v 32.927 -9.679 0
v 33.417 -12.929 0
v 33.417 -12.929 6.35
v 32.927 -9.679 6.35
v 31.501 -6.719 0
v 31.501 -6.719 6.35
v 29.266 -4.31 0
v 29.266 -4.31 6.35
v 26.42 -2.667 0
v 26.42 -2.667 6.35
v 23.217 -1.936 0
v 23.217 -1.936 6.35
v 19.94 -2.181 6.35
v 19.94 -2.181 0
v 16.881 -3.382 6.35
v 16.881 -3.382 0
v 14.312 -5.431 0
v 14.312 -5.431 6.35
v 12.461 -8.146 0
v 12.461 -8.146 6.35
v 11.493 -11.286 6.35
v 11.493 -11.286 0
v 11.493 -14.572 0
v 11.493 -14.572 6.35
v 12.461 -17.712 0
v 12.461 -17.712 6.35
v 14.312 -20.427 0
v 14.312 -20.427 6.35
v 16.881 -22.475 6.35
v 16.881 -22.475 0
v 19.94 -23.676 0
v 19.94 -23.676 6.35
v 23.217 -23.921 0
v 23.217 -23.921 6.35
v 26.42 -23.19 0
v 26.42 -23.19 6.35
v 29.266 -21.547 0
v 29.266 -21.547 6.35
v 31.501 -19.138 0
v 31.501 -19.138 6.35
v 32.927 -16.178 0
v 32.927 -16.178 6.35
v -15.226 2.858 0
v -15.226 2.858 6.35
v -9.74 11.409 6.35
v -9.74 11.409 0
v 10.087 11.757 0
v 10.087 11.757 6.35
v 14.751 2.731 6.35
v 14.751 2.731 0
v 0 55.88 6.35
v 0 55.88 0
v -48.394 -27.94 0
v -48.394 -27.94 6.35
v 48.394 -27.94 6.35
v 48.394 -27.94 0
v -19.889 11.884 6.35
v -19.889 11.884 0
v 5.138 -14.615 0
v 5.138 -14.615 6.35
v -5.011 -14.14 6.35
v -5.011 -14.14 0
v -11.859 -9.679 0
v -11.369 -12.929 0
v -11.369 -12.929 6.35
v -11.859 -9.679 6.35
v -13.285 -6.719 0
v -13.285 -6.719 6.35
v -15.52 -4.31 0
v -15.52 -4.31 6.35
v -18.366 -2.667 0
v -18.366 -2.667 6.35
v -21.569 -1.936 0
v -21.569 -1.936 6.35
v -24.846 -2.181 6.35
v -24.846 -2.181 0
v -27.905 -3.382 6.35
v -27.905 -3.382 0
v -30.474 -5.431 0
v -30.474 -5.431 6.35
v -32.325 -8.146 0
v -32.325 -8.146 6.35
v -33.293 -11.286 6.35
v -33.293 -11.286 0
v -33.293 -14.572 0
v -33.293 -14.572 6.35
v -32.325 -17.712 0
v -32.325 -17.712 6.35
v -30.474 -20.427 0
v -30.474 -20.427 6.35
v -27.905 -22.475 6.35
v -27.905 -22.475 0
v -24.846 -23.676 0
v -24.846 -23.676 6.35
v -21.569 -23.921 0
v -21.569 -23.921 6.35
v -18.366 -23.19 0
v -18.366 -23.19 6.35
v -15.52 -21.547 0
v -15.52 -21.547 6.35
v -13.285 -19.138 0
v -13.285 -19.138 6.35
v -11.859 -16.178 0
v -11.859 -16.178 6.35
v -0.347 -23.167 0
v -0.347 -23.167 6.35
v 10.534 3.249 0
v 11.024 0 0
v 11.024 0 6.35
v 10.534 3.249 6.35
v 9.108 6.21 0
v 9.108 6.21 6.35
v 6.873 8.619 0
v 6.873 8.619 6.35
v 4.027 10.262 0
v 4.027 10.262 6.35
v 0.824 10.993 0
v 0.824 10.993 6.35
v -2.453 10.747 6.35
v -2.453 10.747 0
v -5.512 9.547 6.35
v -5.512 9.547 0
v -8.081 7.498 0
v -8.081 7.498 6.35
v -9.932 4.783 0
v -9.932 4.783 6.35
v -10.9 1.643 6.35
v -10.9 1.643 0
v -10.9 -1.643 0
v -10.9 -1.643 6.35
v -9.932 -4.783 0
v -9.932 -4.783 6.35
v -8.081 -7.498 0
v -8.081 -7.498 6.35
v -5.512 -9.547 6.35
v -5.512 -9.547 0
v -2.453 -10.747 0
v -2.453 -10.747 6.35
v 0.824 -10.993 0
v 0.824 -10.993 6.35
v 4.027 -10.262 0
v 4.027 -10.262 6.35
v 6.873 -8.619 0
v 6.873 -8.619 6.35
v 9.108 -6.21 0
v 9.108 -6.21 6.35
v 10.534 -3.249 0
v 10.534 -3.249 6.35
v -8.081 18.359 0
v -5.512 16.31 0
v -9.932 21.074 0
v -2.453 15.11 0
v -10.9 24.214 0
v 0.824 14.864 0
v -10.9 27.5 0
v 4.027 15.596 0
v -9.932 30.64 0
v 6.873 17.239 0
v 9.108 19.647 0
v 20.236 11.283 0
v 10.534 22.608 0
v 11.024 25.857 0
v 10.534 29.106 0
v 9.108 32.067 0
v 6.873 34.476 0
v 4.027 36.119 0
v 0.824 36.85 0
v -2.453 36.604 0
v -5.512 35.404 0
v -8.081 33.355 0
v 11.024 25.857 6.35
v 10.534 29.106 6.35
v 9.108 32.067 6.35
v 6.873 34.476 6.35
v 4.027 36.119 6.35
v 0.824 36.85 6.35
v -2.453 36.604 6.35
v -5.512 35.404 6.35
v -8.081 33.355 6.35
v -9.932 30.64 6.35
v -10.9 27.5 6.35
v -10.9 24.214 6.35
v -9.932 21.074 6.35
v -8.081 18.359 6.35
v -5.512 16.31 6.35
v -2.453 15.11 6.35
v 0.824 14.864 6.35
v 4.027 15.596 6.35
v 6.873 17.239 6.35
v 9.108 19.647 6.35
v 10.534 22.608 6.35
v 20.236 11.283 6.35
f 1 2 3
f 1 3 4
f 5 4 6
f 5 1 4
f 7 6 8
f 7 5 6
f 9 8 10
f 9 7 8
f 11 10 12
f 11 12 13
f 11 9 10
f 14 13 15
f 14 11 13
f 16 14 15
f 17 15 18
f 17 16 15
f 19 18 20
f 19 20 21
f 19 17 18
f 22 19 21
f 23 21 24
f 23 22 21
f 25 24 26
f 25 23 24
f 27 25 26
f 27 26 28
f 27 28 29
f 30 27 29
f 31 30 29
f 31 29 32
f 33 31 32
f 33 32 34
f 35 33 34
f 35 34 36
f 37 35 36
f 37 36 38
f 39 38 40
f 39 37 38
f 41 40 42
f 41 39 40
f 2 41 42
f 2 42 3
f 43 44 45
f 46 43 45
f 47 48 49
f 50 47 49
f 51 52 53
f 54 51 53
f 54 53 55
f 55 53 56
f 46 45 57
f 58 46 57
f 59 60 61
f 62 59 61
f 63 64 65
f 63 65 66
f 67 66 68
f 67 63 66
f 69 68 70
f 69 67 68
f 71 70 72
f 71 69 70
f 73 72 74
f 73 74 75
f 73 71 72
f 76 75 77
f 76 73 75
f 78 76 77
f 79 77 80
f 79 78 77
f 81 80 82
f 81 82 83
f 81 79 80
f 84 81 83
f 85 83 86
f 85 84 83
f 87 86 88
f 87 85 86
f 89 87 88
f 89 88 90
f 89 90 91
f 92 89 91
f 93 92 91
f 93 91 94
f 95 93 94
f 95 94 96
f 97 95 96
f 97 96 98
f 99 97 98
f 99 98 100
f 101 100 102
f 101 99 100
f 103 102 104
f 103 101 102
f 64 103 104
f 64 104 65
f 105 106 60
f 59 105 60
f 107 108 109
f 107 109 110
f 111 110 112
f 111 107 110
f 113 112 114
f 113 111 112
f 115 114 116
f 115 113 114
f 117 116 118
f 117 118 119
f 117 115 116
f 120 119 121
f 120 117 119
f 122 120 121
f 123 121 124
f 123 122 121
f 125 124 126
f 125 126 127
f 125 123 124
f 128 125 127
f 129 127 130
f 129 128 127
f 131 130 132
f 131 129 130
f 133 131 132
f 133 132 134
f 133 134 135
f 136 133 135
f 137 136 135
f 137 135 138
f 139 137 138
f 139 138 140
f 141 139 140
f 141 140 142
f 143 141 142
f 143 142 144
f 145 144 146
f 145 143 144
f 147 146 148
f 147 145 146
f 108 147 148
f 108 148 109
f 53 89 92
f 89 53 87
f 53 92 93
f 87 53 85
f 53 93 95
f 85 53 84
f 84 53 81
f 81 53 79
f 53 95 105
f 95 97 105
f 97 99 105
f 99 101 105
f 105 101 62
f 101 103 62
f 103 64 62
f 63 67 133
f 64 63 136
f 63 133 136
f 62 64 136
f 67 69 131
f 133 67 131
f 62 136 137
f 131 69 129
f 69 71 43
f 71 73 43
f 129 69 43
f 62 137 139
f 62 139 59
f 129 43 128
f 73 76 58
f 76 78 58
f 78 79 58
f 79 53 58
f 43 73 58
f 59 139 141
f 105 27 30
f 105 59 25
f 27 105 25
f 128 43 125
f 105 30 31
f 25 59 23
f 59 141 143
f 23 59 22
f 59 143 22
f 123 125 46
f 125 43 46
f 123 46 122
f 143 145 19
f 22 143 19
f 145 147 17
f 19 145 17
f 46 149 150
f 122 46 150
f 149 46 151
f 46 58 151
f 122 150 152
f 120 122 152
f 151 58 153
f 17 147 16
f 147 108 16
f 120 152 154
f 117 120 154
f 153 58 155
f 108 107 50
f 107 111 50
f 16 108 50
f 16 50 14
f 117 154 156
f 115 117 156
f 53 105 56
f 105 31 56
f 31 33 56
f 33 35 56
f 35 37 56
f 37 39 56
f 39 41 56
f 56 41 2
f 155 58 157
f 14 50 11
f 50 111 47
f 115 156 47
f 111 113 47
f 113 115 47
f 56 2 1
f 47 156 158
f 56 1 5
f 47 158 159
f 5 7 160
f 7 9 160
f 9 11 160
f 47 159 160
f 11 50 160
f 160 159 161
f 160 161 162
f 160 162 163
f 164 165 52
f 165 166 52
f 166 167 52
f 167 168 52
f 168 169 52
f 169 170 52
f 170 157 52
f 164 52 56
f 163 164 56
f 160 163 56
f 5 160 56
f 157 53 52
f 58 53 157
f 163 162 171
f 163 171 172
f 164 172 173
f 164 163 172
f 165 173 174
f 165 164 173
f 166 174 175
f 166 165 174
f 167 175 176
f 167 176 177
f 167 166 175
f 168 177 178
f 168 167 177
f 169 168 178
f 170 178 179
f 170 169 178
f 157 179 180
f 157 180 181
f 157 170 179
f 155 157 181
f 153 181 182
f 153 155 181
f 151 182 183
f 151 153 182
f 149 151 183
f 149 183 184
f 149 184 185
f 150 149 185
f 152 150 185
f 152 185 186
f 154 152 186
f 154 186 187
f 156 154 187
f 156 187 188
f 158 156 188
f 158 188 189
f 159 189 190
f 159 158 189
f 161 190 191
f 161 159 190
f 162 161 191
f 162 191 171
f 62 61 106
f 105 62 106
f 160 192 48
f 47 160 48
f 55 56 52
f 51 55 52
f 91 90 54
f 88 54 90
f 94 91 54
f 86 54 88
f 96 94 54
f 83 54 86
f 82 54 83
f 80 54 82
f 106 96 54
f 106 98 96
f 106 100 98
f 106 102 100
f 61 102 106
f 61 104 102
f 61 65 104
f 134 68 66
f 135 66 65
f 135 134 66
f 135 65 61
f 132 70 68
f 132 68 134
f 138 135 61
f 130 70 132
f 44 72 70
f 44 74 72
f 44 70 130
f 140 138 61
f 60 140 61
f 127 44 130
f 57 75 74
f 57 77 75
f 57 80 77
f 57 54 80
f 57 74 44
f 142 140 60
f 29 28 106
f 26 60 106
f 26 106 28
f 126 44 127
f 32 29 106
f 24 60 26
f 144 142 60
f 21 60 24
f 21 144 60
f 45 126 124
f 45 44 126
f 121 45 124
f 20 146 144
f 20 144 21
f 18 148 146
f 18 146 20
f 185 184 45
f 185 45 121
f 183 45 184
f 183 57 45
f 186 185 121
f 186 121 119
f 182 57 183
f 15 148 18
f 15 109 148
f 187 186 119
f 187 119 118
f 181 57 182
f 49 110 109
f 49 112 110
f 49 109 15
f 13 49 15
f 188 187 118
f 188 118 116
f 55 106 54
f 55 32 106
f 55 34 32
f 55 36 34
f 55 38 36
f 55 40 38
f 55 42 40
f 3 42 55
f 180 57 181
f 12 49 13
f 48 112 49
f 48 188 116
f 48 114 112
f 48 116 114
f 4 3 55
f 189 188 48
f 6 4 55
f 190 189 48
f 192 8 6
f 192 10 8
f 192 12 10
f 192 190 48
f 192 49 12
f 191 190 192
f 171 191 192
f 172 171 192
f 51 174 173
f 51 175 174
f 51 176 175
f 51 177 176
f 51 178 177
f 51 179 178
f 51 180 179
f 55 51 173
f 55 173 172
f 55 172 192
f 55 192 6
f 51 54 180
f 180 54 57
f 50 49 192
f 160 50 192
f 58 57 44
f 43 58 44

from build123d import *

# Parameters (mm, degrees)
F0_R     = 11.0236
F1_DEPTH = 6.35
F3_DEPTH = 6.35


with BuildPart() as f1:
    # F0 (on Top) → F1 (new body)
    with BuildSketch(Plane.XY):
        Polygon((-48.3935, -27.94), (48.3935, -27.94), (0, 55.88), align=None)
        with Locations((-22.392992, -12.9286)):
            Circle(F0_R, mode=Mode.SUBTRACT)
        with Locations((22.392992, -12.9286)):
            Circle(F0_R, mode=Mode.SUBTRACT)
        Circle(F0_R, mode=Mode.SUBTRACT)
        with Locations((0, 25.8572)):
            Circle(F0_R, mode=Mode.SUBTRACT)
    extrude(amount=F1_DEPTH)

    # F2 (on face) → F3 (cut)
    with BuildSketch(Plane.XY.offset(6.35)):
        Polygon((-9.740262, 11.409466), (-19.889175, 11.883968), (-15.225649, 2.8575), align=None)
        Polygon((5.138157, -14.614549), (-5.010757, -14.140047), (-0.347231, -23.166515), align=None)
        Polygon((10.087492, 11.757049), (14.751018, 2.730581), (20.236406, 11.282547), align=None)
    extrude(amount=-F3_DEPTH, mode=Mode.SUBTRACT)


solid = f1.part
